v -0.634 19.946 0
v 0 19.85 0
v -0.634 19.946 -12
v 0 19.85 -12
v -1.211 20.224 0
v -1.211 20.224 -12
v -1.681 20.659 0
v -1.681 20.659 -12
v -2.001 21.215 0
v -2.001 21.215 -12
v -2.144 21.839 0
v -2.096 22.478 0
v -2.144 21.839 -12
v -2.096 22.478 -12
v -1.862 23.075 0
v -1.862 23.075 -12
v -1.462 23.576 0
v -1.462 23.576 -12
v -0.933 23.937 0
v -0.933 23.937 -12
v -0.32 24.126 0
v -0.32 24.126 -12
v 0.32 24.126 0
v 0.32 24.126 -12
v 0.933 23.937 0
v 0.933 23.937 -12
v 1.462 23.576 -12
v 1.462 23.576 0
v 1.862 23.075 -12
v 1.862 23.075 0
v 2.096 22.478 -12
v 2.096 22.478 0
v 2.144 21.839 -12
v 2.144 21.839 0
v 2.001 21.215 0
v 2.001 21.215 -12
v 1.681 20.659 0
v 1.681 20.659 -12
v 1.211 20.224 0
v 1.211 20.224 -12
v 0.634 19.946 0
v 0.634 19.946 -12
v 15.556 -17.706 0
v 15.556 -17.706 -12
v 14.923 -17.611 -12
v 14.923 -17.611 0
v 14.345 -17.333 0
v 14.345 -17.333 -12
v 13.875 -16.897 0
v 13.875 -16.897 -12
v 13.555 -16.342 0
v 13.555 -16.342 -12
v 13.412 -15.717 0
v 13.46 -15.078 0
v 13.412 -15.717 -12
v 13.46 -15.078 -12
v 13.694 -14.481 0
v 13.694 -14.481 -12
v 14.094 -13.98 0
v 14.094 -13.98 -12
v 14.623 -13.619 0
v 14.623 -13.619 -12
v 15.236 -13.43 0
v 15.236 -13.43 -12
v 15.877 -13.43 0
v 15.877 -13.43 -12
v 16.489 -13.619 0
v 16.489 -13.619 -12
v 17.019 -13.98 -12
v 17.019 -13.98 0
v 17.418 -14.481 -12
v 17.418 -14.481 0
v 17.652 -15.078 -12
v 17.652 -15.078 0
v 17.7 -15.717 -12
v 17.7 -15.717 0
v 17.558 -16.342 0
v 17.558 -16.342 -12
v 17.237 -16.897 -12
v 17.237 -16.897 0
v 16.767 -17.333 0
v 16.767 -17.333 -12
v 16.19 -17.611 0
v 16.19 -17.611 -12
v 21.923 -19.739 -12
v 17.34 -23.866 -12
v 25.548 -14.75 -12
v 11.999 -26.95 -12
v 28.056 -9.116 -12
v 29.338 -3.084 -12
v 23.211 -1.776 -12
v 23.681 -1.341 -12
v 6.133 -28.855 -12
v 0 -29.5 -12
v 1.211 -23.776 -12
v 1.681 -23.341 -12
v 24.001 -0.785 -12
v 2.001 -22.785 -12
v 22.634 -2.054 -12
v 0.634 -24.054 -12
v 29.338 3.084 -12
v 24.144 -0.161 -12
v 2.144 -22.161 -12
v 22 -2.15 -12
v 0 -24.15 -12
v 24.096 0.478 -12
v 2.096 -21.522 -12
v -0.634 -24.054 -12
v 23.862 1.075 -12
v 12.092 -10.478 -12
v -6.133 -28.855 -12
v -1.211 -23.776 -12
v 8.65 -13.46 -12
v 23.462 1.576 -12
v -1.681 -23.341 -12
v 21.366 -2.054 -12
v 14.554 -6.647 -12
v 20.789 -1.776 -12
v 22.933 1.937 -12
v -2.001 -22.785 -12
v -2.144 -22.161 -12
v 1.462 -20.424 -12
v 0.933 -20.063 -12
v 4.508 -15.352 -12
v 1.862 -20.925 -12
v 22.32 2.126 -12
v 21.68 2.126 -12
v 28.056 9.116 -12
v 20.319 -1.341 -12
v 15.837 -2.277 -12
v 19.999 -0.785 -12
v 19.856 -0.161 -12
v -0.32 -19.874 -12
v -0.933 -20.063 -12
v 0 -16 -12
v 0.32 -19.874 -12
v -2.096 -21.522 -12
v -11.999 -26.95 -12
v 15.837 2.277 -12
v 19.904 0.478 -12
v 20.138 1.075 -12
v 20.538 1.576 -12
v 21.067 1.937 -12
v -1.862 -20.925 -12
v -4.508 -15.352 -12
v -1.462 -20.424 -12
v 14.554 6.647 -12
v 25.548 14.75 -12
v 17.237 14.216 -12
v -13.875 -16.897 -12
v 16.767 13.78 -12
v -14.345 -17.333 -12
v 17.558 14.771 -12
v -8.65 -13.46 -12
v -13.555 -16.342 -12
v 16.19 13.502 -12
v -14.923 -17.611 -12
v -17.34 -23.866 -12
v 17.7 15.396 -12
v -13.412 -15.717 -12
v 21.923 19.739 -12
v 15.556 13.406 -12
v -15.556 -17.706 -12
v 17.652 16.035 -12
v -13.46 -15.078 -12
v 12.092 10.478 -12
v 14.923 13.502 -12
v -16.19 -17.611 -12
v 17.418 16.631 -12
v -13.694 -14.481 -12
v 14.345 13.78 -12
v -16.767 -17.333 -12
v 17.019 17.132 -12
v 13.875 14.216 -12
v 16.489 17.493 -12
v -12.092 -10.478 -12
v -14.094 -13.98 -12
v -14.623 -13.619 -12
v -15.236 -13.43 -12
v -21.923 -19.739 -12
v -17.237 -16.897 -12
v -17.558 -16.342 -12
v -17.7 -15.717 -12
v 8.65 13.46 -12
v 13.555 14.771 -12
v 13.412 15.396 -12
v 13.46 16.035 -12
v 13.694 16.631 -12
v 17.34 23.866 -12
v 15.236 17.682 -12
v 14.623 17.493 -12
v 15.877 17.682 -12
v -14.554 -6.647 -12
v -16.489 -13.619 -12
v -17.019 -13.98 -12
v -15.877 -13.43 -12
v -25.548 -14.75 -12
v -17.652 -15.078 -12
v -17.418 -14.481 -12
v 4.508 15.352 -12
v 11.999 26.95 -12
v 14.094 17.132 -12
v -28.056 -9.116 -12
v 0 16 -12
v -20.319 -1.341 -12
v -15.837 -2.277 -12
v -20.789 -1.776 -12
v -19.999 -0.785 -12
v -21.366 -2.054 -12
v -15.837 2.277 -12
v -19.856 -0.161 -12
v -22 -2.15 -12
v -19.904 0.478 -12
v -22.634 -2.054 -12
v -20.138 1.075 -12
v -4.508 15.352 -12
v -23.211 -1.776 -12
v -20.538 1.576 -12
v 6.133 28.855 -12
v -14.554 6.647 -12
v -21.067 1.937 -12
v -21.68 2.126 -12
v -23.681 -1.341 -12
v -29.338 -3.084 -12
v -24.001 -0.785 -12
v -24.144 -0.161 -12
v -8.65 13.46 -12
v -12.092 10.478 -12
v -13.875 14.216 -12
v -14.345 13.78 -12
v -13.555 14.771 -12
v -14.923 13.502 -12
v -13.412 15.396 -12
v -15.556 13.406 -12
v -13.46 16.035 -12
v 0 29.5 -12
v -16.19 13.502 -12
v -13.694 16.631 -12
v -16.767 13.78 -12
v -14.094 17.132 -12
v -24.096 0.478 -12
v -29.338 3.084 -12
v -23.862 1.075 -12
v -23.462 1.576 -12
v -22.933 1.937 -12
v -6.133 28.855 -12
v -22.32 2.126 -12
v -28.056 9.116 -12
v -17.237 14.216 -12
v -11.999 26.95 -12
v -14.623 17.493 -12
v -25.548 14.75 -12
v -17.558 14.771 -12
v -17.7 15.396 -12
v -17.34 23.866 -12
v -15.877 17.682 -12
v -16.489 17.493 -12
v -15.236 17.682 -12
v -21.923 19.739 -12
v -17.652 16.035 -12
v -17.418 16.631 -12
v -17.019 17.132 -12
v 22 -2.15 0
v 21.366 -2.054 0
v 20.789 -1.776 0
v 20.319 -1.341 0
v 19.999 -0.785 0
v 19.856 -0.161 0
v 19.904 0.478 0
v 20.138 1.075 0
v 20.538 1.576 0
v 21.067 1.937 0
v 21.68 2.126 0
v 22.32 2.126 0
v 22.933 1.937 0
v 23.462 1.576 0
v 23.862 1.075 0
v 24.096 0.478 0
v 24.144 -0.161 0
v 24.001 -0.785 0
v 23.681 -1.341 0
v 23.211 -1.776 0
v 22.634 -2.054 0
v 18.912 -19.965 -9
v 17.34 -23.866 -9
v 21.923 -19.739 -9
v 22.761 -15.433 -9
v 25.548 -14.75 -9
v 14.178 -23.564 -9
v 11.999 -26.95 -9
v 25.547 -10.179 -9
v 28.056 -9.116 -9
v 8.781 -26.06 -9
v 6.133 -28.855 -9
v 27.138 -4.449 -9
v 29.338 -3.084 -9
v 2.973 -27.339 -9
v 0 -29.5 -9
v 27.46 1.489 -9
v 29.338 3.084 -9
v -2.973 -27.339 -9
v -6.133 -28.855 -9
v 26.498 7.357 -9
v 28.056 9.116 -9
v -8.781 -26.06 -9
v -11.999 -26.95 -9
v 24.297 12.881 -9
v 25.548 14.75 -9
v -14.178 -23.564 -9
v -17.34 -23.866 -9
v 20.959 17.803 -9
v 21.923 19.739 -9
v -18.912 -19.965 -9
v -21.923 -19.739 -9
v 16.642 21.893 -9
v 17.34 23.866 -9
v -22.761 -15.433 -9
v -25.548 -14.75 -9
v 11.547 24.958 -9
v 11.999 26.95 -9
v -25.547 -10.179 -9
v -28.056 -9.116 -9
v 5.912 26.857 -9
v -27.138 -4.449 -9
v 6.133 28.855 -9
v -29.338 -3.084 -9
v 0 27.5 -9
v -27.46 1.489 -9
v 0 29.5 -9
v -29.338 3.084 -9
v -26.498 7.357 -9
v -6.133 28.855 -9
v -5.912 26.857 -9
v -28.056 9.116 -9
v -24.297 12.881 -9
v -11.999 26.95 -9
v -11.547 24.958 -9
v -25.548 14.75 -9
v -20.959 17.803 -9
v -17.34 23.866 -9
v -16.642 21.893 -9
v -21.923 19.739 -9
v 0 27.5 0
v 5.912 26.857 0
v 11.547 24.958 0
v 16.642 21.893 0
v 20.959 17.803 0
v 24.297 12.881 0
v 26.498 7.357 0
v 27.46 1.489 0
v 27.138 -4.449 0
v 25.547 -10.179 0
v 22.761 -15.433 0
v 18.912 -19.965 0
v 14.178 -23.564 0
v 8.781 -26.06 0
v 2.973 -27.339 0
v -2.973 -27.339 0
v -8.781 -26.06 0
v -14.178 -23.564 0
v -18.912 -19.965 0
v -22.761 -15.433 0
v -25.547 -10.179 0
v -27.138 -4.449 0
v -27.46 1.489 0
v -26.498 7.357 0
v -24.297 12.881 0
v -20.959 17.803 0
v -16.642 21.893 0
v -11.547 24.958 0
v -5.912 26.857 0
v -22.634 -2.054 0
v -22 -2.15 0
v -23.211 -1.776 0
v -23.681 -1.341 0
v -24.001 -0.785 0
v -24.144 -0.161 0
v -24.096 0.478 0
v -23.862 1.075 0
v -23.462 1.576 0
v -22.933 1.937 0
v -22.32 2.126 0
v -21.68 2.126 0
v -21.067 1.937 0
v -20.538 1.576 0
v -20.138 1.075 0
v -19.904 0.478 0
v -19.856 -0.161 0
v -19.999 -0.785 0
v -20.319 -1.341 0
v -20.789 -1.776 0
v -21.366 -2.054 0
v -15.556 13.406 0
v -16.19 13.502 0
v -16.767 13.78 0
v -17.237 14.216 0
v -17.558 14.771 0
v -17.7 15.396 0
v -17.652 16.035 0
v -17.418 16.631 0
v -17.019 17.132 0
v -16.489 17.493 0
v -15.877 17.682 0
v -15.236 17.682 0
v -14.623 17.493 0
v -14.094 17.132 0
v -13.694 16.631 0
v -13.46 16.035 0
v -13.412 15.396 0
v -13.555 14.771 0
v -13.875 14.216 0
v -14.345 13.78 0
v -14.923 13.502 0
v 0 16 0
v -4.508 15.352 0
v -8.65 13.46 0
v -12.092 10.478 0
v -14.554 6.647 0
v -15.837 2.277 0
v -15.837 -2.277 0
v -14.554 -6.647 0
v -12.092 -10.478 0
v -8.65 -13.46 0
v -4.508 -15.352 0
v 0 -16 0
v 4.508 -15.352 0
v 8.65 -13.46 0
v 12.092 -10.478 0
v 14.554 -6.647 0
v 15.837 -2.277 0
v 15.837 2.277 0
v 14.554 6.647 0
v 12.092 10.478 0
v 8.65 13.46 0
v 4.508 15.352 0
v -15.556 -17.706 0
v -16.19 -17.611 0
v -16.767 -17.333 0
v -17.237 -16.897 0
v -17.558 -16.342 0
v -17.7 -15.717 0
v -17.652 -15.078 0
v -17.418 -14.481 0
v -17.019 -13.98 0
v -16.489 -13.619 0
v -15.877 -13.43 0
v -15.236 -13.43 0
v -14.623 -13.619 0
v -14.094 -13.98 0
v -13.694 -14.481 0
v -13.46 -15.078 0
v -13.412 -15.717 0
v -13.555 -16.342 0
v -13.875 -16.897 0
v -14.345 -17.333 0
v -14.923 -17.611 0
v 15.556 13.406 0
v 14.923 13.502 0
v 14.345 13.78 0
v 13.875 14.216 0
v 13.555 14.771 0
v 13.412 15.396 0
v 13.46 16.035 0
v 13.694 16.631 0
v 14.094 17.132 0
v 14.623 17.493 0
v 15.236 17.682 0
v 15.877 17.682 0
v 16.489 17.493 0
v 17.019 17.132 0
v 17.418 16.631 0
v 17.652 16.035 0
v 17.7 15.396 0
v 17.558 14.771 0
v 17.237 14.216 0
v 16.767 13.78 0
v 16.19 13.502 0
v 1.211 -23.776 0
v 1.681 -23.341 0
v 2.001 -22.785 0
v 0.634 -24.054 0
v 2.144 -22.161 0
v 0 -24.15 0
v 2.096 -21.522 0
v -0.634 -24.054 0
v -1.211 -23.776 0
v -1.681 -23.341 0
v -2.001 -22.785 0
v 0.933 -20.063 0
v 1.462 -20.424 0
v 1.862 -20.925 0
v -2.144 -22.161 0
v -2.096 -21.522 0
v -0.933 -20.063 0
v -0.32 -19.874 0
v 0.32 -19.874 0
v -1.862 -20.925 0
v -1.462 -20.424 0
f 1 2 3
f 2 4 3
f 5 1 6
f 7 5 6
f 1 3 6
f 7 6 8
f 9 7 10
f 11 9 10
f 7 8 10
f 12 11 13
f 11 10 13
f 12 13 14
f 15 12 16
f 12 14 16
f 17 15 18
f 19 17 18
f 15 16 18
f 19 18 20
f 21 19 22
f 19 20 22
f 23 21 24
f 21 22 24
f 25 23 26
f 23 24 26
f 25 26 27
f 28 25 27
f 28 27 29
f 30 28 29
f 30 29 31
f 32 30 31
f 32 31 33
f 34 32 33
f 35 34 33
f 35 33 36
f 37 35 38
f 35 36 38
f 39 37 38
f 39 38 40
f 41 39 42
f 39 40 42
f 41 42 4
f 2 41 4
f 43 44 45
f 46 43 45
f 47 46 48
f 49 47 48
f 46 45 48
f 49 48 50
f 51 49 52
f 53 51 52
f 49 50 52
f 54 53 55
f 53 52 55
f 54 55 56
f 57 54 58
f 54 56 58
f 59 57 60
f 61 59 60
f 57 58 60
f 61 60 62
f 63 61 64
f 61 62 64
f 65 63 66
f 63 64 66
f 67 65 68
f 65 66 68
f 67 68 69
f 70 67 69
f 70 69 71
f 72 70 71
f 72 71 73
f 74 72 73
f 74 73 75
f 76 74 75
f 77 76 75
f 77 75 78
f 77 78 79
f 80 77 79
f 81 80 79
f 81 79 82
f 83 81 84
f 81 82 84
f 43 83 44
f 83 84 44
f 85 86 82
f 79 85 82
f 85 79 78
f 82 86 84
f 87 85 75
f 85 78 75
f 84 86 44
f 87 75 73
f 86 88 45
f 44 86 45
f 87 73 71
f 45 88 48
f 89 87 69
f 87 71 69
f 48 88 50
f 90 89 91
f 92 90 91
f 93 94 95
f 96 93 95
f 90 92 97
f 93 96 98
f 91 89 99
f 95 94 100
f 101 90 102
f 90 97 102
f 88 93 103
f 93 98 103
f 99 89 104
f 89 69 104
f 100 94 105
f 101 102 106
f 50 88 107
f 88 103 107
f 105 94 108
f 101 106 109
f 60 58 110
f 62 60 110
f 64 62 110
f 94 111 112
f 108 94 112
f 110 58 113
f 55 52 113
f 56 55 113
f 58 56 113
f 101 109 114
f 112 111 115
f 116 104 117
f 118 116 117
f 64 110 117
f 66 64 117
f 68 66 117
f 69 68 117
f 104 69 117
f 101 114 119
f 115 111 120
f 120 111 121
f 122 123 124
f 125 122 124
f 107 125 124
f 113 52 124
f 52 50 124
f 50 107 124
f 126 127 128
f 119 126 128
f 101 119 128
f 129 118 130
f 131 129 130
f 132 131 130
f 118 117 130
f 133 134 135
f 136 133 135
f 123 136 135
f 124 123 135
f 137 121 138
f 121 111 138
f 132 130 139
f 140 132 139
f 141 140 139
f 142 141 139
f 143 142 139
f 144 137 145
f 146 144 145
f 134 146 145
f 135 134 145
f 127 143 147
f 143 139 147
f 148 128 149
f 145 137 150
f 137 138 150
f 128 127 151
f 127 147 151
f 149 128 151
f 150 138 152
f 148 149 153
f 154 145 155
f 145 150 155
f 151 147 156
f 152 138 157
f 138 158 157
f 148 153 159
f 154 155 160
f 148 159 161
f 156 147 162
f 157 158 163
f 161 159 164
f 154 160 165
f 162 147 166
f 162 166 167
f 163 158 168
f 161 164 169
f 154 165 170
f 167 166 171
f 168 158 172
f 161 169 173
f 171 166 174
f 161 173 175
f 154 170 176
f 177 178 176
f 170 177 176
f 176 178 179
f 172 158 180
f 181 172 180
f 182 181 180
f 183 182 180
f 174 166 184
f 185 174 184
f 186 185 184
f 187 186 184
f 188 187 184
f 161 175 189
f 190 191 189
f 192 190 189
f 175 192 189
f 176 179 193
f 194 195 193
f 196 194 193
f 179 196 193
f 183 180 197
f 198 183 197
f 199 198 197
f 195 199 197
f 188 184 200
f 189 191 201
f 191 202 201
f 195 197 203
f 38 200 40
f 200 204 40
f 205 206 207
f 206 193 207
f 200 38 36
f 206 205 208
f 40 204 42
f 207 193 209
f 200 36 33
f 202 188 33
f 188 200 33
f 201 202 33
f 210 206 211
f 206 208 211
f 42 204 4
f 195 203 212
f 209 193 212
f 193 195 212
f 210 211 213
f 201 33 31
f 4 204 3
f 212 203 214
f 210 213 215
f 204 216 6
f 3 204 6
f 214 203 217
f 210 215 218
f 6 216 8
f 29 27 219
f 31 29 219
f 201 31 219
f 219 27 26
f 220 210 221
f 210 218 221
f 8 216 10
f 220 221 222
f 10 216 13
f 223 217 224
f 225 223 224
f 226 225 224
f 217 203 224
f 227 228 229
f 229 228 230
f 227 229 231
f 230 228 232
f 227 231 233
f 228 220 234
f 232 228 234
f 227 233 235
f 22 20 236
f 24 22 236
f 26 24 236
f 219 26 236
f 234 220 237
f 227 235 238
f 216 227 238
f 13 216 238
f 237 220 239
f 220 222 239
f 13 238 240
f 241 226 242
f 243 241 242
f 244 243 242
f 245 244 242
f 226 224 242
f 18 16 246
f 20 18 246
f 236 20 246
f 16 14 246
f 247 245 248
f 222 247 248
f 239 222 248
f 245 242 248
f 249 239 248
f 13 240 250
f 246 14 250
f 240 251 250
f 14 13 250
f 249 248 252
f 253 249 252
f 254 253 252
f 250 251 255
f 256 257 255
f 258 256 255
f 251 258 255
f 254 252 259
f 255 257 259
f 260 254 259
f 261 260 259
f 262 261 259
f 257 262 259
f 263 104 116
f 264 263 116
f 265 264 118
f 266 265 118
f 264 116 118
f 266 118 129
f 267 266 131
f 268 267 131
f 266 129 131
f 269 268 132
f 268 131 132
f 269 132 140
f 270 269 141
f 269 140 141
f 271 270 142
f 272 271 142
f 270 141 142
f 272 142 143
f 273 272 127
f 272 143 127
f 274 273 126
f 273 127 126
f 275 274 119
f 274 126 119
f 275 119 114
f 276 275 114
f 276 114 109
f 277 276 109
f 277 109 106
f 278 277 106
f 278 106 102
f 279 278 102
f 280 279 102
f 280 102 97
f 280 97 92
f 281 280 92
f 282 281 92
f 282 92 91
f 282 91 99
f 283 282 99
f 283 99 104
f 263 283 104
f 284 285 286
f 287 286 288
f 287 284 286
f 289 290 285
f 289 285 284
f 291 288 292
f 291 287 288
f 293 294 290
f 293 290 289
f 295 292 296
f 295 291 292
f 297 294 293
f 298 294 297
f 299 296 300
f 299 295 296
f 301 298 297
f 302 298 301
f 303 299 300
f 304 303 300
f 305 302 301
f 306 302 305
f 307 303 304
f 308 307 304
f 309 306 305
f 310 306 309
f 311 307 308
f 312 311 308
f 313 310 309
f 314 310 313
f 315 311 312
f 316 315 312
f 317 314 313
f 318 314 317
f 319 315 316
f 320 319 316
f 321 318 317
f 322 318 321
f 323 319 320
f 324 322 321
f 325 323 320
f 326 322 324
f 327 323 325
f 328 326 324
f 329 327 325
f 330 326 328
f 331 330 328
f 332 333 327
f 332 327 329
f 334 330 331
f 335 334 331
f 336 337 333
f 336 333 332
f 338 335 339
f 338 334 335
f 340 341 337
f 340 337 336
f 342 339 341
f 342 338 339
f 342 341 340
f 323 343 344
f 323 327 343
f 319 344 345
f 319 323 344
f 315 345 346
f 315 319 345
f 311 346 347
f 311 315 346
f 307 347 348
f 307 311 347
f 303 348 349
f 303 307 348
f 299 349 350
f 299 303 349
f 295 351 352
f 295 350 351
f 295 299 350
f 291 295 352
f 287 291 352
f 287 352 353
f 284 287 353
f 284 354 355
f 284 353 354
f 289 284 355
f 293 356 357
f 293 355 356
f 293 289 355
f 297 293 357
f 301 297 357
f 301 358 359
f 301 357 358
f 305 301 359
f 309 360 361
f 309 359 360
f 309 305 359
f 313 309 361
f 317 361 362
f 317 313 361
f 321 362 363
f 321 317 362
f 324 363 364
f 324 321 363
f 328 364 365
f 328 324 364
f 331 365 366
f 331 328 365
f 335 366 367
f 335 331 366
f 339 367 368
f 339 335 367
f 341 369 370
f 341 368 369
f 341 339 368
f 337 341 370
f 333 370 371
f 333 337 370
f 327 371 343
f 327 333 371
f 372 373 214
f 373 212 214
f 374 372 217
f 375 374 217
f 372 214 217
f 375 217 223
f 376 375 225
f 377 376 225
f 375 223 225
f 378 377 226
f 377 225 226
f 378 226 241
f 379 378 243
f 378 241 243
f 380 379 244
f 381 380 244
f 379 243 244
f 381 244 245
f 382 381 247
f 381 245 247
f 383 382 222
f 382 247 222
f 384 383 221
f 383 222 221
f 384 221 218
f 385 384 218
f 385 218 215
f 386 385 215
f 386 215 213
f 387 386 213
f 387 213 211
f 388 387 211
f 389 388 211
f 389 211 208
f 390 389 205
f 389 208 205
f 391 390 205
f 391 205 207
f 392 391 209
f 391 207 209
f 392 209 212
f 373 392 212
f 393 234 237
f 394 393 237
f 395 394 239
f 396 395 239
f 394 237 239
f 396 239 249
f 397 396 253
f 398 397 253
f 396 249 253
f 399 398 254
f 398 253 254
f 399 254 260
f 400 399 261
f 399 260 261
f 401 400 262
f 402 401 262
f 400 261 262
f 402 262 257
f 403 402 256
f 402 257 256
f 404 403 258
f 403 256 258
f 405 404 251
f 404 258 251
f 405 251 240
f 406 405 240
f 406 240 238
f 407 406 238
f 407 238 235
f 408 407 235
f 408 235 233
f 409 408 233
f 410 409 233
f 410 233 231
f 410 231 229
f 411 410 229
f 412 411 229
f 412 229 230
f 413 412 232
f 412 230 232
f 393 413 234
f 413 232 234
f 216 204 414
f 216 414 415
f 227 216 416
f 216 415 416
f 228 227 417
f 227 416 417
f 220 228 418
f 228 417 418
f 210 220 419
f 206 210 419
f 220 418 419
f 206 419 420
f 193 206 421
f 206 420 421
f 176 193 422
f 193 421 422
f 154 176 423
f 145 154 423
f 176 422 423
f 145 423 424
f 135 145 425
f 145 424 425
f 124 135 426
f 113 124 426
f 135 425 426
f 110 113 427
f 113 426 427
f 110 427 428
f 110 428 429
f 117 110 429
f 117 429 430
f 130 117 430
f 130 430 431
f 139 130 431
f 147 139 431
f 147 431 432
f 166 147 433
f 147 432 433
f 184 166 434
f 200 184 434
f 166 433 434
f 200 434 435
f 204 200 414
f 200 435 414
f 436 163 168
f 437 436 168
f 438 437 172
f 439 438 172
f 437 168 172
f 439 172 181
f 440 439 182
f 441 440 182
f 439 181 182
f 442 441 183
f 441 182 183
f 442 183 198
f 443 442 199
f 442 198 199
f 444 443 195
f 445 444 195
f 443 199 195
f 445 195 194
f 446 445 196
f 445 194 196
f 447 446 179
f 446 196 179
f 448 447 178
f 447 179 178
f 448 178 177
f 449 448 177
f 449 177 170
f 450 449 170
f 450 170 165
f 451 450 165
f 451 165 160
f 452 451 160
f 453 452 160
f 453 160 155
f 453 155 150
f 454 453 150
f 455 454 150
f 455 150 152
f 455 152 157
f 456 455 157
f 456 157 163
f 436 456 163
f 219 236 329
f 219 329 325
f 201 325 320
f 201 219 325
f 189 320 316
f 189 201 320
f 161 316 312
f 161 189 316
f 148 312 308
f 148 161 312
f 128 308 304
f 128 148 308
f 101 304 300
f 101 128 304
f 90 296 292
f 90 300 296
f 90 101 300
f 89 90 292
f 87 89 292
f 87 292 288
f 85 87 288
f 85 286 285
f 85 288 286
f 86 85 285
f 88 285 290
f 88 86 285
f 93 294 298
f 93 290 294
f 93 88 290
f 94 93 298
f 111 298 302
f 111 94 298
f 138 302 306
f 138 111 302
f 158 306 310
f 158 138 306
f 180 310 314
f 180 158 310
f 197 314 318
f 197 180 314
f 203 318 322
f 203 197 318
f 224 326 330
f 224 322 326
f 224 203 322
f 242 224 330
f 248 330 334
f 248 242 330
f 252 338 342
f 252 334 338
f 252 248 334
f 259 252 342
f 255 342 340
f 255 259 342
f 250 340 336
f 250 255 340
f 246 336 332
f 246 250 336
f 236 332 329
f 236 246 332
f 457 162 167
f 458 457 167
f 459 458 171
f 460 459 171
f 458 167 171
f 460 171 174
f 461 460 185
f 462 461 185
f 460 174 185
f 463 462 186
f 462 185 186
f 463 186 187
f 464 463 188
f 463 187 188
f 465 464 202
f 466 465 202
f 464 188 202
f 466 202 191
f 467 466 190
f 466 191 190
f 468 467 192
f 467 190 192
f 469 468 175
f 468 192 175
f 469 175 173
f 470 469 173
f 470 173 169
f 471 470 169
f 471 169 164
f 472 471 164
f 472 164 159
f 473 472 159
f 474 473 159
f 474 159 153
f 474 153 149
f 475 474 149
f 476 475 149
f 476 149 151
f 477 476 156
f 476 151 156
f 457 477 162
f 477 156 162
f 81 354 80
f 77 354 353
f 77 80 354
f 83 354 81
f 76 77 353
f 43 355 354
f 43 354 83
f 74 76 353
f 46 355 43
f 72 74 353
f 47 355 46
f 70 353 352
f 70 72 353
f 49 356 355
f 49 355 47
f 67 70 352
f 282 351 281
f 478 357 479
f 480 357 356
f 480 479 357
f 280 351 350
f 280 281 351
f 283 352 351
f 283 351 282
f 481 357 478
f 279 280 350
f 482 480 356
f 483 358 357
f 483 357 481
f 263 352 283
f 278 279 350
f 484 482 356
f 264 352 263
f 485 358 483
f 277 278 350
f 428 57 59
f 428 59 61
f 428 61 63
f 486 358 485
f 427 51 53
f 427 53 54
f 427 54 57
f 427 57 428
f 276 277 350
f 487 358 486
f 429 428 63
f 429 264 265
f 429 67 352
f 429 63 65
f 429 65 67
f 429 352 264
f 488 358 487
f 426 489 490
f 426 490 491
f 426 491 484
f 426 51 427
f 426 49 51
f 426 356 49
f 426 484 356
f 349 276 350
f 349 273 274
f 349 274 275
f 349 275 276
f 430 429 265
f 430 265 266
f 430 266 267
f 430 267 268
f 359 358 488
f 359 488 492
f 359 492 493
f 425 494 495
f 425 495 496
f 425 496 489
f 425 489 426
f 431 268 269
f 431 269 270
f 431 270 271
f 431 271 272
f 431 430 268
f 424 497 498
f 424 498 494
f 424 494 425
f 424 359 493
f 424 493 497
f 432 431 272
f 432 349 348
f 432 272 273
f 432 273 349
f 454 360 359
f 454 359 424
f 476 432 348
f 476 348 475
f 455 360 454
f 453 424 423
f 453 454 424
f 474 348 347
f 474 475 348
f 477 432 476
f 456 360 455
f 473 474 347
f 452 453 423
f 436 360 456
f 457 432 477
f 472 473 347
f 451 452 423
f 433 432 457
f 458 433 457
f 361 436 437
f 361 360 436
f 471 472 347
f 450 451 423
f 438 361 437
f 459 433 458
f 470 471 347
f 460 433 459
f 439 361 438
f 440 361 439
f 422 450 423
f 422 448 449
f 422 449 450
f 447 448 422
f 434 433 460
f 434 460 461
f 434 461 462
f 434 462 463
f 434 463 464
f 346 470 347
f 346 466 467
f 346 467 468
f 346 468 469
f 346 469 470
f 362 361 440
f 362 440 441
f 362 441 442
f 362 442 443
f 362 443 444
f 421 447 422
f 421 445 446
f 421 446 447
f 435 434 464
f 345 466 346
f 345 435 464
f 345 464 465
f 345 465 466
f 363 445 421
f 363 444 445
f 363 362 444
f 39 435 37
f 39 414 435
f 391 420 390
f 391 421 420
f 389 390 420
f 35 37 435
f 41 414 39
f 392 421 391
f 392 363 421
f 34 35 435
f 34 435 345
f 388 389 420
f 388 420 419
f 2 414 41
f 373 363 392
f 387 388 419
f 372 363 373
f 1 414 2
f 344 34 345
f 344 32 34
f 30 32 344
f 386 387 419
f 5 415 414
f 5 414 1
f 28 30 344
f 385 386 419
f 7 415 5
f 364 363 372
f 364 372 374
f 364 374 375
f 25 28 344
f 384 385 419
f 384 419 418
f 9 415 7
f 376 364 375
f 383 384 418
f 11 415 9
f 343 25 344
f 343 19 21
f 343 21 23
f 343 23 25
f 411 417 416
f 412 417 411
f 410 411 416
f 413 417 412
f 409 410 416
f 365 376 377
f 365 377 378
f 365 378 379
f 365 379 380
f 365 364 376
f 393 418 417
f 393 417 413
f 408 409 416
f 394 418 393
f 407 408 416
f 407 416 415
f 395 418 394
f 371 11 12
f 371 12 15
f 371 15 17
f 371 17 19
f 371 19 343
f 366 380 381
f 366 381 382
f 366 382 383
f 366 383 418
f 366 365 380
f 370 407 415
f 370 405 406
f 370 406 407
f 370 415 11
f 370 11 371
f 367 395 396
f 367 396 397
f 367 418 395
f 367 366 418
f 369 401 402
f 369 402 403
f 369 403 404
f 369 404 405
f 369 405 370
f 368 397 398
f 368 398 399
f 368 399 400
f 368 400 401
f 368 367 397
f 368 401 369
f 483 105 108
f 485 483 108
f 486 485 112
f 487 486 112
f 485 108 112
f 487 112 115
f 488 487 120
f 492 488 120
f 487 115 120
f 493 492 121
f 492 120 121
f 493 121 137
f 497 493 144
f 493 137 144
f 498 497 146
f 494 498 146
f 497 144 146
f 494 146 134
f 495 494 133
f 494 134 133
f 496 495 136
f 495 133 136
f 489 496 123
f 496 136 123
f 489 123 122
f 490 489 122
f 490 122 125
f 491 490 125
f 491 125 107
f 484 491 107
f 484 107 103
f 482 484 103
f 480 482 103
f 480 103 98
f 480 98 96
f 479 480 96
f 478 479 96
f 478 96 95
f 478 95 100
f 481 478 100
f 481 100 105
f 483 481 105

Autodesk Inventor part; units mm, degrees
ref_plane "YZ Plane" through (0, 0, 0) normal (1, 0, 0) x (0, 1, 0)
ref_plane "XZ Plane" through (0, 0, 0) normal (0, 1, 0) x (-1, 0, 0)
ref_plane "XY Plane" through (0, 0, 0) normal (0, 0, 1) x (1, 0, 0)
sketch "スケッチ1" plane through (0, 0, 0) normal (1, 0, 0) x (0, 1, 0)
  line L0 (16, 0) -> (27.5, 0)
  line L1 (27.5, 0) -> (27.5, -9)
  line L2 (27.5, -9) -> (29.5, -9)
  line L3 (29.5, -9) -> (29.5, -12)
  line L4 (16, -12) -> (16, 0)
  line L5 (0, -14.4) -> (0, 2.4) projected
  line L6 (29.5, -12) -> (16, -12)
  point P0 (0, 0)
  dimension "d5" = 9
  dimension "d30" = 2
  dimension "d31" = 27.5
  dimension "d32" = 3
  dimension "d33" = 16
revolve "回転1" add sketch "スケッチ1" angle 360 about axis through (0, 0, -10) along (0, 0, 1)
sketch "スケッチ2" plane through (0, 0, 0) normal (0, 0, 1) x (1, 0, 0)
  circle A0 centre (0, 0) radius 22
  point P0 (0, 22)
  point P1 (-15.5563, 15.5563)
  point P2 (-22, 0)
  point P3 (-15.5563, -15.5563)
  point P4 (0, -22)
  point P5 (15.5563, -15.5563)
  point P6 (22, 0)
  point P7 (15.5563, 15.5563)
  dimension "d11" = 44
  dimension "d14" = 360
hole "穴1" at (0, 22, 0) at (-15.5563, 15.5563, 0) at (-22, 0, 0) at (-15.5563, -15.5563, 0) at (0, -22, 0) at (15.5563, -15.5563, 0) at (22, 0, 0) at (15.5563, 15.5563, 0) direction (0, 0, -1) diameter 4.3 end through all clearance for "Socket Head Cap Screw" size "M4" standard "Ansi Metric M Profile"
properties part number "base9"
